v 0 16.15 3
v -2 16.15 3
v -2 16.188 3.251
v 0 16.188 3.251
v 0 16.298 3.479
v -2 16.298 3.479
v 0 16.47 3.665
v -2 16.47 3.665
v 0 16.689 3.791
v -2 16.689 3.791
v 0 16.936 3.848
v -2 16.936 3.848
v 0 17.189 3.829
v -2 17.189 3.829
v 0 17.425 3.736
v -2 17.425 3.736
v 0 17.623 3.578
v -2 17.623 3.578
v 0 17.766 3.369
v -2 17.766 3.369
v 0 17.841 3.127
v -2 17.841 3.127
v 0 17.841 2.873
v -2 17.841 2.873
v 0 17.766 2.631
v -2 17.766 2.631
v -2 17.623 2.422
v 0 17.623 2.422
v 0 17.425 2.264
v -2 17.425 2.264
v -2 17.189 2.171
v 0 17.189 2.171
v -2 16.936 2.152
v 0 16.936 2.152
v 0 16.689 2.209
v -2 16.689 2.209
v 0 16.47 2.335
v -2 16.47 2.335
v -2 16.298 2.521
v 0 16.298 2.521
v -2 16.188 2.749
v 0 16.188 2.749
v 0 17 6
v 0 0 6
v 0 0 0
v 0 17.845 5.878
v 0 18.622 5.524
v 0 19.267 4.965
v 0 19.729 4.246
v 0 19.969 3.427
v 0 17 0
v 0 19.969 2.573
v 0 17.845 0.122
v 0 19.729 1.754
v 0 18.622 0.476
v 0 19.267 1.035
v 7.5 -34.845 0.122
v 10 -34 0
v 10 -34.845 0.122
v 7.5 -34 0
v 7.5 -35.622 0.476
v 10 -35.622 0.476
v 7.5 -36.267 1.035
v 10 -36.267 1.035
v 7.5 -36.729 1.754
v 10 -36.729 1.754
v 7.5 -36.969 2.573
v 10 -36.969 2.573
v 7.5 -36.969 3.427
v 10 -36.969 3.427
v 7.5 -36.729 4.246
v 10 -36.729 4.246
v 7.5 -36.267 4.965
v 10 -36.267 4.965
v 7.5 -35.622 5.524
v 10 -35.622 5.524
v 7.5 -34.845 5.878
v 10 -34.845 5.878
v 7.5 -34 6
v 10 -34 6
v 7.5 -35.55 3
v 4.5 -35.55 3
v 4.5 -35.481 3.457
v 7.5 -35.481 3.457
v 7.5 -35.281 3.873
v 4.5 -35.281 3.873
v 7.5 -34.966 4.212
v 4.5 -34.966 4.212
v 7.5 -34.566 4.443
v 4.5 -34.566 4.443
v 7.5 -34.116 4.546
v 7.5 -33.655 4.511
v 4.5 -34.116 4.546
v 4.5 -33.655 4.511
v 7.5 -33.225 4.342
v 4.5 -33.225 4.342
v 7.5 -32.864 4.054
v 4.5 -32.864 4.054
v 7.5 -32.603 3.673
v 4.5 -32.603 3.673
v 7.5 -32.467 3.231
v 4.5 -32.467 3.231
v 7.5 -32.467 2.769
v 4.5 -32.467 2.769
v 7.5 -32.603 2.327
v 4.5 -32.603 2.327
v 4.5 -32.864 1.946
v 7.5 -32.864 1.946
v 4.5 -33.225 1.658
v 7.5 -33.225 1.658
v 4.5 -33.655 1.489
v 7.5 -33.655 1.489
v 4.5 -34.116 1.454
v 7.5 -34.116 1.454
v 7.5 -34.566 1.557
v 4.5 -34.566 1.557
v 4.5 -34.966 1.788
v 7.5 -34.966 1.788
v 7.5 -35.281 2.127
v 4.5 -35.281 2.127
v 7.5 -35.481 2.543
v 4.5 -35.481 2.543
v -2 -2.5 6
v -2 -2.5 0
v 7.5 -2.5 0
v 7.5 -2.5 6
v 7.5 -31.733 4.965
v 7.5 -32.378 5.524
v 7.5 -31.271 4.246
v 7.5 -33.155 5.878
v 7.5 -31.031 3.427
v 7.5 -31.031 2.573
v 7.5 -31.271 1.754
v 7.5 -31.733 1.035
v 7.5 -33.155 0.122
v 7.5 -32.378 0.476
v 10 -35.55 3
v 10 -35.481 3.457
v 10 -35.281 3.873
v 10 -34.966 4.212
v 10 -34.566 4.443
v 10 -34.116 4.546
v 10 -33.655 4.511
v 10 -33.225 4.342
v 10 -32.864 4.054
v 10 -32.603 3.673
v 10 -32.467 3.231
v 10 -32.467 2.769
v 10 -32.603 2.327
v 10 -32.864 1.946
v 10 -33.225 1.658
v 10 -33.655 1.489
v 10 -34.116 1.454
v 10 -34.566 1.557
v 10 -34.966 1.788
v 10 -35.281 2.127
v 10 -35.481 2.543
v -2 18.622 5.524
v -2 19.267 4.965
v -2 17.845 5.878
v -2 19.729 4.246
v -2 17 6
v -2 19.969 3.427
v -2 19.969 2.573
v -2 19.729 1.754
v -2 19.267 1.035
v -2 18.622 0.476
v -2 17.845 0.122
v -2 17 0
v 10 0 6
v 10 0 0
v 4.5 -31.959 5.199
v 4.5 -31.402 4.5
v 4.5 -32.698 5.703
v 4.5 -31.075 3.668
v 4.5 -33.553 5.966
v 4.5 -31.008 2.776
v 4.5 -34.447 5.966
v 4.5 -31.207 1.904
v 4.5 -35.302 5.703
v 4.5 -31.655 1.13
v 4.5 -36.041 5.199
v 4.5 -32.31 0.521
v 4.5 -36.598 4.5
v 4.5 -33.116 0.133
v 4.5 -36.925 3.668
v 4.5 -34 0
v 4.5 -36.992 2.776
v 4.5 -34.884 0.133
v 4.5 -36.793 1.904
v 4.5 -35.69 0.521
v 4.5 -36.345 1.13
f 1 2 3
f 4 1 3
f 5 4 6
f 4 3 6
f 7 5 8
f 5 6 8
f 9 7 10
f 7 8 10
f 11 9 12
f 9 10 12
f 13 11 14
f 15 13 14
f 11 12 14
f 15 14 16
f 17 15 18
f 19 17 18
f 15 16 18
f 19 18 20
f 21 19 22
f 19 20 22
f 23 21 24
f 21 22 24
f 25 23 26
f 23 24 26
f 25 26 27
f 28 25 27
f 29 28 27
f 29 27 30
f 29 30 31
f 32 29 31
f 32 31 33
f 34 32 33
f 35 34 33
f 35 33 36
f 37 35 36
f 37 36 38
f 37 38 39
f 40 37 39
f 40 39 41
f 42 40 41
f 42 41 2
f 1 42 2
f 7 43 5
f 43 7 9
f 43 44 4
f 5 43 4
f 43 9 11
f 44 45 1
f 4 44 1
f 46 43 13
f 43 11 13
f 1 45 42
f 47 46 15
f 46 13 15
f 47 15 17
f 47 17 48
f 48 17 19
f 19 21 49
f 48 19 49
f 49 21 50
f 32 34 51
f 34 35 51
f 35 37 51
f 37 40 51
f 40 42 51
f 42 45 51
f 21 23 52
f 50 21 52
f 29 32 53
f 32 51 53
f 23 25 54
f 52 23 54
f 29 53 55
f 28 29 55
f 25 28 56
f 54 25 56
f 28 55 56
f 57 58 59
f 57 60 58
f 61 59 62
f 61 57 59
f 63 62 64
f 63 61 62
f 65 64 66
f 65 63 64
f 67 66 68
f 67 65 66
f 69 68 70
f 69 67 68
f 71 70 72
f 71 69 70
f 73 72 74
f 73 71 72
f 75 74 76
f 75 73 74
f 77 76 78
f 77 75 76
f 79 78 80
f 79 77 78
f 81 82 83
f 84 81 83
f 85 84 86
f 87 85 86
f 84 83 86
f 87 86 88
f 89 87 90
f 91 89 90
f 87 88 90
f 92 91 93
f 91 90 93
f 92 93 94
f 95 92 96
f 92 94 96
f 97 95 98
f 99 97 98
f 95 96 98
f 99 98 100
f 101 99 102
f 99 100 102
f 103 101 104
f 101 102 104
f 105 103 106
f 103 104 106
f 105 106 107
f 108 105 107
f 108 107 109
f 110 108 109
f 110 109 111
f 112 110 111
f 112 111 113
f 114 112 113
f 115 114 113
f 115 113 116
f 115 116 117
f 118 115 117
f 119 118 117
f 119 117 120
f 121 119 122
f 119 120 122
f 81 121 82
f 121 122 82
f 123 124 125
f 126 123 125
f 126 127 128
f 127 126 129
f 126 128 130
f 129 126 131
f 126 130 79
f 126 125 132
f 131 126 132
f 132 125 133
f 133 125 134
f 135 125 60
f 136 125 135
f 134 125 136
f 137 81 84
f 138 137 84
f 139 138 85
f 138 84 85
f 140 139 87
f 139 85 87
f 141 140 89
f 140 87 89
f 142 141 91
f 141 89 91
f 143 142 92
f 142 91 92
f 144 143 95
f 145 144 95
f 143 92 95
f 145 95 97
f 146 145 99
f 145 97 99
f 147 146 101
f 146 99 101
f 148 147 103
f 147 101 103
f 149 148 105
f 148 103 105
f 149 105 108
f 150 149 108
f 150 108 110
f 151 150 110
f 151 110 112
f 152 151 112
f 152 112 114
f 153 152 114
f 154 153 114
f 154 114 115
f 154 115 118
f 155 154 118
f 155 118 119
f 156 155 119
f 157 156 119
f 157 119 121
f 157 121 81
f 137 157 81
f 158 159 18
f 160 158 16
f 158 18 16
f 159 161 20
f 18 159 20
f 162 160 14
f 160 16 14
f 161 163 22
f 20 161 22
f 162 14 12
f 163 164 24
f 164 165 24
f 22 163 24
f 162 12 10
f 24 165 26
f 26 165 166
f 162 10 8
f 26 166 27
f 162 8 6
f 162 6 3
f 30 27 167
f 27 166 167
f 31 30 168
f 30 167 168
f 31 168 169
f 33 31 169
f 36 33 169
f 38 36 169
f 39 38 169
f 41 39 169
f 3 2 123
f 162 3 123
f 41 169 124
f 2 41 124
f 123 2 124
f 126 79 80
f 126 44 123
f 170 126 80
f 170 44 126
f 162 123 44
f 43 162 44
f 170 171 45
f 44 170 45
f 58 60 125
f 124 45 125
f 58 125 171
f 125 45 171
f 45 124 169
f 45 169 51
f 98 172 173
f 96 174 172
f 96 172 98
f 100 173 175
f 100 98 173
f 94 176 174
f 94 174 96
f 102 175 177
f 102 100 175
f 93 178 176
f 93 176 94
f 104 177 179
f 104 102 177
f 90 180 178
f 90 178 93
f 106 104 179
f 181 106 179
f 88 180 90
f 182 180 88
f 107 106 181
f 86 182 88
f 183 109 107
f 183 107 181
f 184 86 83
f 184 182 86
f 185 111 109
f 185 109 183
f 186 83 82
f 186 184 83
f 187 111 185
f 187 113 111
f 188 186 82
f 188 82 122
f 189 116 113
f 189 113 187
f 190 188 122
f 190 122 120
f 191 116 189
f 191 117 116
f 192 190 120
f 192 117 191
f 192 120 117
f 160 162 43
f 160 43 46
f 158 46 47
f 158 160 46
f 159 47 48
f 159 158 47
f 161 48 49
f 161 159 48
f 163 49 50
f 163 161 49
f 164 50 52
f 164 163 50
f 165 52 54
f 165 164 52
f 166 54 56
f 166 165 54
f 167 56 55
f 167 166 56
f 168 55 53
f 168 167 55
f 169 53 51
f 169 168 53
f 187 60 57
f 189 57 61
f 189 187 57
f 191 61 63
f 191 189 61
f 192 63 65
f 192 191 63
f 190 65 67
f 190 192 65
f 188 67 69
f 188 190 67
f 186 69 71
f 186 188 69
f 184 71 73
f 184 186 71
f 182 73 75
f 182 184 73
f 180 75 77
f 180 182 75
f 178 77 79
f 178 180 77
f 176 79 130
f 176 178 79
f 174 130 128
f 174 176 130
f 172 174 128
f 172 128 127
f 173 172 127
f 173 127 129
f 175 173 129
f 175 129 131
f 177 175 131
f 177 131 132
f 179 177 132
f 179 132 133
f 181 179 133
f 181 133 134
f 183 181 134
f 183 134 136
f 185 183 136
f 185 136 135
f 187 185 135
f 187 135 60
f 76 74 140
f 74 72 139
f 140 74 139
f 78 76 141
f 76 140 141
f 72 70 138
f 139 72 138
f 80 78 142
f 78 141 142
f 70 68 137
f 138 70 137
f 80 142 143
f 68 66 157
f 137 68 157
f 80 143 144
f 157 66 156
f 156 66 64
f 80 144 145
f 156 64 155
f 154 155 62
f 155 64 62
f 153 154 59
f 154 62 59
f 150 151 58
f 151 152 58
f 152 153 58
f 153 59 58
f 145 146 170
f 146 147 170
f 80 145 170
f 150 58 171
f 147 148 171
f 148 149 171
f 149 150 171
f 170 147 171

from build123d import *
from build123d.topology import SkipClean

# Parameters (mm, degrees)
EXTRUDE_1_DEPTH     = 6
FILLET_3_RADIUS     = 3
FILLET_3_LENGTH     = 2
FILLET_4_RADIUS     = 3
FILLET_4_LENGTH     = 2.5
SKETCH_2_R          = 0.85
SKETCH_2_R_2        = 1.55
CUT_EXTRUDE_1_DEPTH = 40.357337308
EXTRUDE_START       = 3
SKETCH_3_R          = 3
SKETCH_3_R_2        = 1.55
EXTRUDE_2_DEPTH     = 3


with BuildPart() as part:
    # 草图1 → 凸台-拉伸1 (new body)
    with BuildSketch(Plane.XY):
        Polygon((-2, -2.5), (7.5, -2.5), (7.5, -37), (10, -37), (10, 0), (0, 0), (0, 20), (-2, 20), (-2, 8.273638366), align=None)
    extrude(amount=EXTRUDE_1_DEPTH)

    # 圆角3: full round fillet: the end face becomes a half cylinder, R = half its width
    fillet_3_face = Plane((-1, 20, 3), x_dir=(-1, 0, 0), z_dir=(0, 1, 0))  # on the end face: x along it, z out of the body
    fillet_3_slab = fillet_3_face.offset(-FILLET_3_RADIUS / 2) * Box(FILLET_3_LENGTH, 2 * FILLET_3_RADIUS, FILLET_3_RADIUS, mode=Mode.PRIVATE)  # the body's end, R deep
    fillet_3_round = Plane((-1, 17, 3), x_dir=(0, 1, 0), z_dir=(-1, 0, 0)) * Cylinder(FILLET_3_RADIUS, FILLET_3_LENGTH, mode=Mode.PRIVATE)  # its axis R under the face
    add(fillet_3_slab - fillet_3_round, mode=Mode.SUBTRACT)

    # 圆角4: full round fillet: the end face becomes a half cylinder, R = half its width
    fillet_4_face = Plane((8.75, -37, 3), x_dir=(-1, 0, 0), z_dir=(0, -1, 0))  # on the end face: x along it, z out of the body
    fillet_4_slab = fillet_4_face.offset(-FILLET_4_RADIUS / 2) * Box(FILLET_4_LENGTH, 2 * FILLET_4_RADIUS, FILLET_4_RADIUS, mode=Mode.PRIVATE)  # the body's end, R deep
    fillet_4_round = Plane((8.75, -34, 3), x_dir=(0, -1, 0), z_dir=(-1, 0, 0)) * Cylinder(FILLET_4_RADIUS, FILLET_4_LENGTH, mode=Mode.PRIVATE)  # its axis R under the face
    add(fillet_4_slab - fillet_4_round, mode=Mode.SUBTRACT)

    # 草图2 → 切除-拉伸1 (cut, through all)
    with BuildSketch(Plane.ZY.offset(2)):
        with Locations(Location((3, 17, 0), (0, 0, 270))):
            Circle(SKETCH_2_R)
        with Locations(Location((3, -34, 0), (0, 0, 270))):
            Circle(SKETCH_2_R_2)
    extrude(amount=-CUT_EXTRUDE_1_DEPTH, mode=Mode.SUBTRACT)

    # 草图3 → 凸台-拉伸2 (add)
    with SkipClean():  # the faces are left unmerged after this step: merging them gives an invalid solid
        with BuildSketch(Plane.ZY.offset(-7.5).offset(EXTRUDE_START)):
            with Locations(Location((3, -34, 0), (0, 0, 180))):
                Circle(SKETCH_3_R)
            with Locations(Location((3, -34, 0), (0, 0, 270))):
                Circle(SKETCH_3_R_2, mode=Mode.SUBTRACT)
        extrude(amount=-EXTRUDE_2_DEPTH)


solid = part.part
